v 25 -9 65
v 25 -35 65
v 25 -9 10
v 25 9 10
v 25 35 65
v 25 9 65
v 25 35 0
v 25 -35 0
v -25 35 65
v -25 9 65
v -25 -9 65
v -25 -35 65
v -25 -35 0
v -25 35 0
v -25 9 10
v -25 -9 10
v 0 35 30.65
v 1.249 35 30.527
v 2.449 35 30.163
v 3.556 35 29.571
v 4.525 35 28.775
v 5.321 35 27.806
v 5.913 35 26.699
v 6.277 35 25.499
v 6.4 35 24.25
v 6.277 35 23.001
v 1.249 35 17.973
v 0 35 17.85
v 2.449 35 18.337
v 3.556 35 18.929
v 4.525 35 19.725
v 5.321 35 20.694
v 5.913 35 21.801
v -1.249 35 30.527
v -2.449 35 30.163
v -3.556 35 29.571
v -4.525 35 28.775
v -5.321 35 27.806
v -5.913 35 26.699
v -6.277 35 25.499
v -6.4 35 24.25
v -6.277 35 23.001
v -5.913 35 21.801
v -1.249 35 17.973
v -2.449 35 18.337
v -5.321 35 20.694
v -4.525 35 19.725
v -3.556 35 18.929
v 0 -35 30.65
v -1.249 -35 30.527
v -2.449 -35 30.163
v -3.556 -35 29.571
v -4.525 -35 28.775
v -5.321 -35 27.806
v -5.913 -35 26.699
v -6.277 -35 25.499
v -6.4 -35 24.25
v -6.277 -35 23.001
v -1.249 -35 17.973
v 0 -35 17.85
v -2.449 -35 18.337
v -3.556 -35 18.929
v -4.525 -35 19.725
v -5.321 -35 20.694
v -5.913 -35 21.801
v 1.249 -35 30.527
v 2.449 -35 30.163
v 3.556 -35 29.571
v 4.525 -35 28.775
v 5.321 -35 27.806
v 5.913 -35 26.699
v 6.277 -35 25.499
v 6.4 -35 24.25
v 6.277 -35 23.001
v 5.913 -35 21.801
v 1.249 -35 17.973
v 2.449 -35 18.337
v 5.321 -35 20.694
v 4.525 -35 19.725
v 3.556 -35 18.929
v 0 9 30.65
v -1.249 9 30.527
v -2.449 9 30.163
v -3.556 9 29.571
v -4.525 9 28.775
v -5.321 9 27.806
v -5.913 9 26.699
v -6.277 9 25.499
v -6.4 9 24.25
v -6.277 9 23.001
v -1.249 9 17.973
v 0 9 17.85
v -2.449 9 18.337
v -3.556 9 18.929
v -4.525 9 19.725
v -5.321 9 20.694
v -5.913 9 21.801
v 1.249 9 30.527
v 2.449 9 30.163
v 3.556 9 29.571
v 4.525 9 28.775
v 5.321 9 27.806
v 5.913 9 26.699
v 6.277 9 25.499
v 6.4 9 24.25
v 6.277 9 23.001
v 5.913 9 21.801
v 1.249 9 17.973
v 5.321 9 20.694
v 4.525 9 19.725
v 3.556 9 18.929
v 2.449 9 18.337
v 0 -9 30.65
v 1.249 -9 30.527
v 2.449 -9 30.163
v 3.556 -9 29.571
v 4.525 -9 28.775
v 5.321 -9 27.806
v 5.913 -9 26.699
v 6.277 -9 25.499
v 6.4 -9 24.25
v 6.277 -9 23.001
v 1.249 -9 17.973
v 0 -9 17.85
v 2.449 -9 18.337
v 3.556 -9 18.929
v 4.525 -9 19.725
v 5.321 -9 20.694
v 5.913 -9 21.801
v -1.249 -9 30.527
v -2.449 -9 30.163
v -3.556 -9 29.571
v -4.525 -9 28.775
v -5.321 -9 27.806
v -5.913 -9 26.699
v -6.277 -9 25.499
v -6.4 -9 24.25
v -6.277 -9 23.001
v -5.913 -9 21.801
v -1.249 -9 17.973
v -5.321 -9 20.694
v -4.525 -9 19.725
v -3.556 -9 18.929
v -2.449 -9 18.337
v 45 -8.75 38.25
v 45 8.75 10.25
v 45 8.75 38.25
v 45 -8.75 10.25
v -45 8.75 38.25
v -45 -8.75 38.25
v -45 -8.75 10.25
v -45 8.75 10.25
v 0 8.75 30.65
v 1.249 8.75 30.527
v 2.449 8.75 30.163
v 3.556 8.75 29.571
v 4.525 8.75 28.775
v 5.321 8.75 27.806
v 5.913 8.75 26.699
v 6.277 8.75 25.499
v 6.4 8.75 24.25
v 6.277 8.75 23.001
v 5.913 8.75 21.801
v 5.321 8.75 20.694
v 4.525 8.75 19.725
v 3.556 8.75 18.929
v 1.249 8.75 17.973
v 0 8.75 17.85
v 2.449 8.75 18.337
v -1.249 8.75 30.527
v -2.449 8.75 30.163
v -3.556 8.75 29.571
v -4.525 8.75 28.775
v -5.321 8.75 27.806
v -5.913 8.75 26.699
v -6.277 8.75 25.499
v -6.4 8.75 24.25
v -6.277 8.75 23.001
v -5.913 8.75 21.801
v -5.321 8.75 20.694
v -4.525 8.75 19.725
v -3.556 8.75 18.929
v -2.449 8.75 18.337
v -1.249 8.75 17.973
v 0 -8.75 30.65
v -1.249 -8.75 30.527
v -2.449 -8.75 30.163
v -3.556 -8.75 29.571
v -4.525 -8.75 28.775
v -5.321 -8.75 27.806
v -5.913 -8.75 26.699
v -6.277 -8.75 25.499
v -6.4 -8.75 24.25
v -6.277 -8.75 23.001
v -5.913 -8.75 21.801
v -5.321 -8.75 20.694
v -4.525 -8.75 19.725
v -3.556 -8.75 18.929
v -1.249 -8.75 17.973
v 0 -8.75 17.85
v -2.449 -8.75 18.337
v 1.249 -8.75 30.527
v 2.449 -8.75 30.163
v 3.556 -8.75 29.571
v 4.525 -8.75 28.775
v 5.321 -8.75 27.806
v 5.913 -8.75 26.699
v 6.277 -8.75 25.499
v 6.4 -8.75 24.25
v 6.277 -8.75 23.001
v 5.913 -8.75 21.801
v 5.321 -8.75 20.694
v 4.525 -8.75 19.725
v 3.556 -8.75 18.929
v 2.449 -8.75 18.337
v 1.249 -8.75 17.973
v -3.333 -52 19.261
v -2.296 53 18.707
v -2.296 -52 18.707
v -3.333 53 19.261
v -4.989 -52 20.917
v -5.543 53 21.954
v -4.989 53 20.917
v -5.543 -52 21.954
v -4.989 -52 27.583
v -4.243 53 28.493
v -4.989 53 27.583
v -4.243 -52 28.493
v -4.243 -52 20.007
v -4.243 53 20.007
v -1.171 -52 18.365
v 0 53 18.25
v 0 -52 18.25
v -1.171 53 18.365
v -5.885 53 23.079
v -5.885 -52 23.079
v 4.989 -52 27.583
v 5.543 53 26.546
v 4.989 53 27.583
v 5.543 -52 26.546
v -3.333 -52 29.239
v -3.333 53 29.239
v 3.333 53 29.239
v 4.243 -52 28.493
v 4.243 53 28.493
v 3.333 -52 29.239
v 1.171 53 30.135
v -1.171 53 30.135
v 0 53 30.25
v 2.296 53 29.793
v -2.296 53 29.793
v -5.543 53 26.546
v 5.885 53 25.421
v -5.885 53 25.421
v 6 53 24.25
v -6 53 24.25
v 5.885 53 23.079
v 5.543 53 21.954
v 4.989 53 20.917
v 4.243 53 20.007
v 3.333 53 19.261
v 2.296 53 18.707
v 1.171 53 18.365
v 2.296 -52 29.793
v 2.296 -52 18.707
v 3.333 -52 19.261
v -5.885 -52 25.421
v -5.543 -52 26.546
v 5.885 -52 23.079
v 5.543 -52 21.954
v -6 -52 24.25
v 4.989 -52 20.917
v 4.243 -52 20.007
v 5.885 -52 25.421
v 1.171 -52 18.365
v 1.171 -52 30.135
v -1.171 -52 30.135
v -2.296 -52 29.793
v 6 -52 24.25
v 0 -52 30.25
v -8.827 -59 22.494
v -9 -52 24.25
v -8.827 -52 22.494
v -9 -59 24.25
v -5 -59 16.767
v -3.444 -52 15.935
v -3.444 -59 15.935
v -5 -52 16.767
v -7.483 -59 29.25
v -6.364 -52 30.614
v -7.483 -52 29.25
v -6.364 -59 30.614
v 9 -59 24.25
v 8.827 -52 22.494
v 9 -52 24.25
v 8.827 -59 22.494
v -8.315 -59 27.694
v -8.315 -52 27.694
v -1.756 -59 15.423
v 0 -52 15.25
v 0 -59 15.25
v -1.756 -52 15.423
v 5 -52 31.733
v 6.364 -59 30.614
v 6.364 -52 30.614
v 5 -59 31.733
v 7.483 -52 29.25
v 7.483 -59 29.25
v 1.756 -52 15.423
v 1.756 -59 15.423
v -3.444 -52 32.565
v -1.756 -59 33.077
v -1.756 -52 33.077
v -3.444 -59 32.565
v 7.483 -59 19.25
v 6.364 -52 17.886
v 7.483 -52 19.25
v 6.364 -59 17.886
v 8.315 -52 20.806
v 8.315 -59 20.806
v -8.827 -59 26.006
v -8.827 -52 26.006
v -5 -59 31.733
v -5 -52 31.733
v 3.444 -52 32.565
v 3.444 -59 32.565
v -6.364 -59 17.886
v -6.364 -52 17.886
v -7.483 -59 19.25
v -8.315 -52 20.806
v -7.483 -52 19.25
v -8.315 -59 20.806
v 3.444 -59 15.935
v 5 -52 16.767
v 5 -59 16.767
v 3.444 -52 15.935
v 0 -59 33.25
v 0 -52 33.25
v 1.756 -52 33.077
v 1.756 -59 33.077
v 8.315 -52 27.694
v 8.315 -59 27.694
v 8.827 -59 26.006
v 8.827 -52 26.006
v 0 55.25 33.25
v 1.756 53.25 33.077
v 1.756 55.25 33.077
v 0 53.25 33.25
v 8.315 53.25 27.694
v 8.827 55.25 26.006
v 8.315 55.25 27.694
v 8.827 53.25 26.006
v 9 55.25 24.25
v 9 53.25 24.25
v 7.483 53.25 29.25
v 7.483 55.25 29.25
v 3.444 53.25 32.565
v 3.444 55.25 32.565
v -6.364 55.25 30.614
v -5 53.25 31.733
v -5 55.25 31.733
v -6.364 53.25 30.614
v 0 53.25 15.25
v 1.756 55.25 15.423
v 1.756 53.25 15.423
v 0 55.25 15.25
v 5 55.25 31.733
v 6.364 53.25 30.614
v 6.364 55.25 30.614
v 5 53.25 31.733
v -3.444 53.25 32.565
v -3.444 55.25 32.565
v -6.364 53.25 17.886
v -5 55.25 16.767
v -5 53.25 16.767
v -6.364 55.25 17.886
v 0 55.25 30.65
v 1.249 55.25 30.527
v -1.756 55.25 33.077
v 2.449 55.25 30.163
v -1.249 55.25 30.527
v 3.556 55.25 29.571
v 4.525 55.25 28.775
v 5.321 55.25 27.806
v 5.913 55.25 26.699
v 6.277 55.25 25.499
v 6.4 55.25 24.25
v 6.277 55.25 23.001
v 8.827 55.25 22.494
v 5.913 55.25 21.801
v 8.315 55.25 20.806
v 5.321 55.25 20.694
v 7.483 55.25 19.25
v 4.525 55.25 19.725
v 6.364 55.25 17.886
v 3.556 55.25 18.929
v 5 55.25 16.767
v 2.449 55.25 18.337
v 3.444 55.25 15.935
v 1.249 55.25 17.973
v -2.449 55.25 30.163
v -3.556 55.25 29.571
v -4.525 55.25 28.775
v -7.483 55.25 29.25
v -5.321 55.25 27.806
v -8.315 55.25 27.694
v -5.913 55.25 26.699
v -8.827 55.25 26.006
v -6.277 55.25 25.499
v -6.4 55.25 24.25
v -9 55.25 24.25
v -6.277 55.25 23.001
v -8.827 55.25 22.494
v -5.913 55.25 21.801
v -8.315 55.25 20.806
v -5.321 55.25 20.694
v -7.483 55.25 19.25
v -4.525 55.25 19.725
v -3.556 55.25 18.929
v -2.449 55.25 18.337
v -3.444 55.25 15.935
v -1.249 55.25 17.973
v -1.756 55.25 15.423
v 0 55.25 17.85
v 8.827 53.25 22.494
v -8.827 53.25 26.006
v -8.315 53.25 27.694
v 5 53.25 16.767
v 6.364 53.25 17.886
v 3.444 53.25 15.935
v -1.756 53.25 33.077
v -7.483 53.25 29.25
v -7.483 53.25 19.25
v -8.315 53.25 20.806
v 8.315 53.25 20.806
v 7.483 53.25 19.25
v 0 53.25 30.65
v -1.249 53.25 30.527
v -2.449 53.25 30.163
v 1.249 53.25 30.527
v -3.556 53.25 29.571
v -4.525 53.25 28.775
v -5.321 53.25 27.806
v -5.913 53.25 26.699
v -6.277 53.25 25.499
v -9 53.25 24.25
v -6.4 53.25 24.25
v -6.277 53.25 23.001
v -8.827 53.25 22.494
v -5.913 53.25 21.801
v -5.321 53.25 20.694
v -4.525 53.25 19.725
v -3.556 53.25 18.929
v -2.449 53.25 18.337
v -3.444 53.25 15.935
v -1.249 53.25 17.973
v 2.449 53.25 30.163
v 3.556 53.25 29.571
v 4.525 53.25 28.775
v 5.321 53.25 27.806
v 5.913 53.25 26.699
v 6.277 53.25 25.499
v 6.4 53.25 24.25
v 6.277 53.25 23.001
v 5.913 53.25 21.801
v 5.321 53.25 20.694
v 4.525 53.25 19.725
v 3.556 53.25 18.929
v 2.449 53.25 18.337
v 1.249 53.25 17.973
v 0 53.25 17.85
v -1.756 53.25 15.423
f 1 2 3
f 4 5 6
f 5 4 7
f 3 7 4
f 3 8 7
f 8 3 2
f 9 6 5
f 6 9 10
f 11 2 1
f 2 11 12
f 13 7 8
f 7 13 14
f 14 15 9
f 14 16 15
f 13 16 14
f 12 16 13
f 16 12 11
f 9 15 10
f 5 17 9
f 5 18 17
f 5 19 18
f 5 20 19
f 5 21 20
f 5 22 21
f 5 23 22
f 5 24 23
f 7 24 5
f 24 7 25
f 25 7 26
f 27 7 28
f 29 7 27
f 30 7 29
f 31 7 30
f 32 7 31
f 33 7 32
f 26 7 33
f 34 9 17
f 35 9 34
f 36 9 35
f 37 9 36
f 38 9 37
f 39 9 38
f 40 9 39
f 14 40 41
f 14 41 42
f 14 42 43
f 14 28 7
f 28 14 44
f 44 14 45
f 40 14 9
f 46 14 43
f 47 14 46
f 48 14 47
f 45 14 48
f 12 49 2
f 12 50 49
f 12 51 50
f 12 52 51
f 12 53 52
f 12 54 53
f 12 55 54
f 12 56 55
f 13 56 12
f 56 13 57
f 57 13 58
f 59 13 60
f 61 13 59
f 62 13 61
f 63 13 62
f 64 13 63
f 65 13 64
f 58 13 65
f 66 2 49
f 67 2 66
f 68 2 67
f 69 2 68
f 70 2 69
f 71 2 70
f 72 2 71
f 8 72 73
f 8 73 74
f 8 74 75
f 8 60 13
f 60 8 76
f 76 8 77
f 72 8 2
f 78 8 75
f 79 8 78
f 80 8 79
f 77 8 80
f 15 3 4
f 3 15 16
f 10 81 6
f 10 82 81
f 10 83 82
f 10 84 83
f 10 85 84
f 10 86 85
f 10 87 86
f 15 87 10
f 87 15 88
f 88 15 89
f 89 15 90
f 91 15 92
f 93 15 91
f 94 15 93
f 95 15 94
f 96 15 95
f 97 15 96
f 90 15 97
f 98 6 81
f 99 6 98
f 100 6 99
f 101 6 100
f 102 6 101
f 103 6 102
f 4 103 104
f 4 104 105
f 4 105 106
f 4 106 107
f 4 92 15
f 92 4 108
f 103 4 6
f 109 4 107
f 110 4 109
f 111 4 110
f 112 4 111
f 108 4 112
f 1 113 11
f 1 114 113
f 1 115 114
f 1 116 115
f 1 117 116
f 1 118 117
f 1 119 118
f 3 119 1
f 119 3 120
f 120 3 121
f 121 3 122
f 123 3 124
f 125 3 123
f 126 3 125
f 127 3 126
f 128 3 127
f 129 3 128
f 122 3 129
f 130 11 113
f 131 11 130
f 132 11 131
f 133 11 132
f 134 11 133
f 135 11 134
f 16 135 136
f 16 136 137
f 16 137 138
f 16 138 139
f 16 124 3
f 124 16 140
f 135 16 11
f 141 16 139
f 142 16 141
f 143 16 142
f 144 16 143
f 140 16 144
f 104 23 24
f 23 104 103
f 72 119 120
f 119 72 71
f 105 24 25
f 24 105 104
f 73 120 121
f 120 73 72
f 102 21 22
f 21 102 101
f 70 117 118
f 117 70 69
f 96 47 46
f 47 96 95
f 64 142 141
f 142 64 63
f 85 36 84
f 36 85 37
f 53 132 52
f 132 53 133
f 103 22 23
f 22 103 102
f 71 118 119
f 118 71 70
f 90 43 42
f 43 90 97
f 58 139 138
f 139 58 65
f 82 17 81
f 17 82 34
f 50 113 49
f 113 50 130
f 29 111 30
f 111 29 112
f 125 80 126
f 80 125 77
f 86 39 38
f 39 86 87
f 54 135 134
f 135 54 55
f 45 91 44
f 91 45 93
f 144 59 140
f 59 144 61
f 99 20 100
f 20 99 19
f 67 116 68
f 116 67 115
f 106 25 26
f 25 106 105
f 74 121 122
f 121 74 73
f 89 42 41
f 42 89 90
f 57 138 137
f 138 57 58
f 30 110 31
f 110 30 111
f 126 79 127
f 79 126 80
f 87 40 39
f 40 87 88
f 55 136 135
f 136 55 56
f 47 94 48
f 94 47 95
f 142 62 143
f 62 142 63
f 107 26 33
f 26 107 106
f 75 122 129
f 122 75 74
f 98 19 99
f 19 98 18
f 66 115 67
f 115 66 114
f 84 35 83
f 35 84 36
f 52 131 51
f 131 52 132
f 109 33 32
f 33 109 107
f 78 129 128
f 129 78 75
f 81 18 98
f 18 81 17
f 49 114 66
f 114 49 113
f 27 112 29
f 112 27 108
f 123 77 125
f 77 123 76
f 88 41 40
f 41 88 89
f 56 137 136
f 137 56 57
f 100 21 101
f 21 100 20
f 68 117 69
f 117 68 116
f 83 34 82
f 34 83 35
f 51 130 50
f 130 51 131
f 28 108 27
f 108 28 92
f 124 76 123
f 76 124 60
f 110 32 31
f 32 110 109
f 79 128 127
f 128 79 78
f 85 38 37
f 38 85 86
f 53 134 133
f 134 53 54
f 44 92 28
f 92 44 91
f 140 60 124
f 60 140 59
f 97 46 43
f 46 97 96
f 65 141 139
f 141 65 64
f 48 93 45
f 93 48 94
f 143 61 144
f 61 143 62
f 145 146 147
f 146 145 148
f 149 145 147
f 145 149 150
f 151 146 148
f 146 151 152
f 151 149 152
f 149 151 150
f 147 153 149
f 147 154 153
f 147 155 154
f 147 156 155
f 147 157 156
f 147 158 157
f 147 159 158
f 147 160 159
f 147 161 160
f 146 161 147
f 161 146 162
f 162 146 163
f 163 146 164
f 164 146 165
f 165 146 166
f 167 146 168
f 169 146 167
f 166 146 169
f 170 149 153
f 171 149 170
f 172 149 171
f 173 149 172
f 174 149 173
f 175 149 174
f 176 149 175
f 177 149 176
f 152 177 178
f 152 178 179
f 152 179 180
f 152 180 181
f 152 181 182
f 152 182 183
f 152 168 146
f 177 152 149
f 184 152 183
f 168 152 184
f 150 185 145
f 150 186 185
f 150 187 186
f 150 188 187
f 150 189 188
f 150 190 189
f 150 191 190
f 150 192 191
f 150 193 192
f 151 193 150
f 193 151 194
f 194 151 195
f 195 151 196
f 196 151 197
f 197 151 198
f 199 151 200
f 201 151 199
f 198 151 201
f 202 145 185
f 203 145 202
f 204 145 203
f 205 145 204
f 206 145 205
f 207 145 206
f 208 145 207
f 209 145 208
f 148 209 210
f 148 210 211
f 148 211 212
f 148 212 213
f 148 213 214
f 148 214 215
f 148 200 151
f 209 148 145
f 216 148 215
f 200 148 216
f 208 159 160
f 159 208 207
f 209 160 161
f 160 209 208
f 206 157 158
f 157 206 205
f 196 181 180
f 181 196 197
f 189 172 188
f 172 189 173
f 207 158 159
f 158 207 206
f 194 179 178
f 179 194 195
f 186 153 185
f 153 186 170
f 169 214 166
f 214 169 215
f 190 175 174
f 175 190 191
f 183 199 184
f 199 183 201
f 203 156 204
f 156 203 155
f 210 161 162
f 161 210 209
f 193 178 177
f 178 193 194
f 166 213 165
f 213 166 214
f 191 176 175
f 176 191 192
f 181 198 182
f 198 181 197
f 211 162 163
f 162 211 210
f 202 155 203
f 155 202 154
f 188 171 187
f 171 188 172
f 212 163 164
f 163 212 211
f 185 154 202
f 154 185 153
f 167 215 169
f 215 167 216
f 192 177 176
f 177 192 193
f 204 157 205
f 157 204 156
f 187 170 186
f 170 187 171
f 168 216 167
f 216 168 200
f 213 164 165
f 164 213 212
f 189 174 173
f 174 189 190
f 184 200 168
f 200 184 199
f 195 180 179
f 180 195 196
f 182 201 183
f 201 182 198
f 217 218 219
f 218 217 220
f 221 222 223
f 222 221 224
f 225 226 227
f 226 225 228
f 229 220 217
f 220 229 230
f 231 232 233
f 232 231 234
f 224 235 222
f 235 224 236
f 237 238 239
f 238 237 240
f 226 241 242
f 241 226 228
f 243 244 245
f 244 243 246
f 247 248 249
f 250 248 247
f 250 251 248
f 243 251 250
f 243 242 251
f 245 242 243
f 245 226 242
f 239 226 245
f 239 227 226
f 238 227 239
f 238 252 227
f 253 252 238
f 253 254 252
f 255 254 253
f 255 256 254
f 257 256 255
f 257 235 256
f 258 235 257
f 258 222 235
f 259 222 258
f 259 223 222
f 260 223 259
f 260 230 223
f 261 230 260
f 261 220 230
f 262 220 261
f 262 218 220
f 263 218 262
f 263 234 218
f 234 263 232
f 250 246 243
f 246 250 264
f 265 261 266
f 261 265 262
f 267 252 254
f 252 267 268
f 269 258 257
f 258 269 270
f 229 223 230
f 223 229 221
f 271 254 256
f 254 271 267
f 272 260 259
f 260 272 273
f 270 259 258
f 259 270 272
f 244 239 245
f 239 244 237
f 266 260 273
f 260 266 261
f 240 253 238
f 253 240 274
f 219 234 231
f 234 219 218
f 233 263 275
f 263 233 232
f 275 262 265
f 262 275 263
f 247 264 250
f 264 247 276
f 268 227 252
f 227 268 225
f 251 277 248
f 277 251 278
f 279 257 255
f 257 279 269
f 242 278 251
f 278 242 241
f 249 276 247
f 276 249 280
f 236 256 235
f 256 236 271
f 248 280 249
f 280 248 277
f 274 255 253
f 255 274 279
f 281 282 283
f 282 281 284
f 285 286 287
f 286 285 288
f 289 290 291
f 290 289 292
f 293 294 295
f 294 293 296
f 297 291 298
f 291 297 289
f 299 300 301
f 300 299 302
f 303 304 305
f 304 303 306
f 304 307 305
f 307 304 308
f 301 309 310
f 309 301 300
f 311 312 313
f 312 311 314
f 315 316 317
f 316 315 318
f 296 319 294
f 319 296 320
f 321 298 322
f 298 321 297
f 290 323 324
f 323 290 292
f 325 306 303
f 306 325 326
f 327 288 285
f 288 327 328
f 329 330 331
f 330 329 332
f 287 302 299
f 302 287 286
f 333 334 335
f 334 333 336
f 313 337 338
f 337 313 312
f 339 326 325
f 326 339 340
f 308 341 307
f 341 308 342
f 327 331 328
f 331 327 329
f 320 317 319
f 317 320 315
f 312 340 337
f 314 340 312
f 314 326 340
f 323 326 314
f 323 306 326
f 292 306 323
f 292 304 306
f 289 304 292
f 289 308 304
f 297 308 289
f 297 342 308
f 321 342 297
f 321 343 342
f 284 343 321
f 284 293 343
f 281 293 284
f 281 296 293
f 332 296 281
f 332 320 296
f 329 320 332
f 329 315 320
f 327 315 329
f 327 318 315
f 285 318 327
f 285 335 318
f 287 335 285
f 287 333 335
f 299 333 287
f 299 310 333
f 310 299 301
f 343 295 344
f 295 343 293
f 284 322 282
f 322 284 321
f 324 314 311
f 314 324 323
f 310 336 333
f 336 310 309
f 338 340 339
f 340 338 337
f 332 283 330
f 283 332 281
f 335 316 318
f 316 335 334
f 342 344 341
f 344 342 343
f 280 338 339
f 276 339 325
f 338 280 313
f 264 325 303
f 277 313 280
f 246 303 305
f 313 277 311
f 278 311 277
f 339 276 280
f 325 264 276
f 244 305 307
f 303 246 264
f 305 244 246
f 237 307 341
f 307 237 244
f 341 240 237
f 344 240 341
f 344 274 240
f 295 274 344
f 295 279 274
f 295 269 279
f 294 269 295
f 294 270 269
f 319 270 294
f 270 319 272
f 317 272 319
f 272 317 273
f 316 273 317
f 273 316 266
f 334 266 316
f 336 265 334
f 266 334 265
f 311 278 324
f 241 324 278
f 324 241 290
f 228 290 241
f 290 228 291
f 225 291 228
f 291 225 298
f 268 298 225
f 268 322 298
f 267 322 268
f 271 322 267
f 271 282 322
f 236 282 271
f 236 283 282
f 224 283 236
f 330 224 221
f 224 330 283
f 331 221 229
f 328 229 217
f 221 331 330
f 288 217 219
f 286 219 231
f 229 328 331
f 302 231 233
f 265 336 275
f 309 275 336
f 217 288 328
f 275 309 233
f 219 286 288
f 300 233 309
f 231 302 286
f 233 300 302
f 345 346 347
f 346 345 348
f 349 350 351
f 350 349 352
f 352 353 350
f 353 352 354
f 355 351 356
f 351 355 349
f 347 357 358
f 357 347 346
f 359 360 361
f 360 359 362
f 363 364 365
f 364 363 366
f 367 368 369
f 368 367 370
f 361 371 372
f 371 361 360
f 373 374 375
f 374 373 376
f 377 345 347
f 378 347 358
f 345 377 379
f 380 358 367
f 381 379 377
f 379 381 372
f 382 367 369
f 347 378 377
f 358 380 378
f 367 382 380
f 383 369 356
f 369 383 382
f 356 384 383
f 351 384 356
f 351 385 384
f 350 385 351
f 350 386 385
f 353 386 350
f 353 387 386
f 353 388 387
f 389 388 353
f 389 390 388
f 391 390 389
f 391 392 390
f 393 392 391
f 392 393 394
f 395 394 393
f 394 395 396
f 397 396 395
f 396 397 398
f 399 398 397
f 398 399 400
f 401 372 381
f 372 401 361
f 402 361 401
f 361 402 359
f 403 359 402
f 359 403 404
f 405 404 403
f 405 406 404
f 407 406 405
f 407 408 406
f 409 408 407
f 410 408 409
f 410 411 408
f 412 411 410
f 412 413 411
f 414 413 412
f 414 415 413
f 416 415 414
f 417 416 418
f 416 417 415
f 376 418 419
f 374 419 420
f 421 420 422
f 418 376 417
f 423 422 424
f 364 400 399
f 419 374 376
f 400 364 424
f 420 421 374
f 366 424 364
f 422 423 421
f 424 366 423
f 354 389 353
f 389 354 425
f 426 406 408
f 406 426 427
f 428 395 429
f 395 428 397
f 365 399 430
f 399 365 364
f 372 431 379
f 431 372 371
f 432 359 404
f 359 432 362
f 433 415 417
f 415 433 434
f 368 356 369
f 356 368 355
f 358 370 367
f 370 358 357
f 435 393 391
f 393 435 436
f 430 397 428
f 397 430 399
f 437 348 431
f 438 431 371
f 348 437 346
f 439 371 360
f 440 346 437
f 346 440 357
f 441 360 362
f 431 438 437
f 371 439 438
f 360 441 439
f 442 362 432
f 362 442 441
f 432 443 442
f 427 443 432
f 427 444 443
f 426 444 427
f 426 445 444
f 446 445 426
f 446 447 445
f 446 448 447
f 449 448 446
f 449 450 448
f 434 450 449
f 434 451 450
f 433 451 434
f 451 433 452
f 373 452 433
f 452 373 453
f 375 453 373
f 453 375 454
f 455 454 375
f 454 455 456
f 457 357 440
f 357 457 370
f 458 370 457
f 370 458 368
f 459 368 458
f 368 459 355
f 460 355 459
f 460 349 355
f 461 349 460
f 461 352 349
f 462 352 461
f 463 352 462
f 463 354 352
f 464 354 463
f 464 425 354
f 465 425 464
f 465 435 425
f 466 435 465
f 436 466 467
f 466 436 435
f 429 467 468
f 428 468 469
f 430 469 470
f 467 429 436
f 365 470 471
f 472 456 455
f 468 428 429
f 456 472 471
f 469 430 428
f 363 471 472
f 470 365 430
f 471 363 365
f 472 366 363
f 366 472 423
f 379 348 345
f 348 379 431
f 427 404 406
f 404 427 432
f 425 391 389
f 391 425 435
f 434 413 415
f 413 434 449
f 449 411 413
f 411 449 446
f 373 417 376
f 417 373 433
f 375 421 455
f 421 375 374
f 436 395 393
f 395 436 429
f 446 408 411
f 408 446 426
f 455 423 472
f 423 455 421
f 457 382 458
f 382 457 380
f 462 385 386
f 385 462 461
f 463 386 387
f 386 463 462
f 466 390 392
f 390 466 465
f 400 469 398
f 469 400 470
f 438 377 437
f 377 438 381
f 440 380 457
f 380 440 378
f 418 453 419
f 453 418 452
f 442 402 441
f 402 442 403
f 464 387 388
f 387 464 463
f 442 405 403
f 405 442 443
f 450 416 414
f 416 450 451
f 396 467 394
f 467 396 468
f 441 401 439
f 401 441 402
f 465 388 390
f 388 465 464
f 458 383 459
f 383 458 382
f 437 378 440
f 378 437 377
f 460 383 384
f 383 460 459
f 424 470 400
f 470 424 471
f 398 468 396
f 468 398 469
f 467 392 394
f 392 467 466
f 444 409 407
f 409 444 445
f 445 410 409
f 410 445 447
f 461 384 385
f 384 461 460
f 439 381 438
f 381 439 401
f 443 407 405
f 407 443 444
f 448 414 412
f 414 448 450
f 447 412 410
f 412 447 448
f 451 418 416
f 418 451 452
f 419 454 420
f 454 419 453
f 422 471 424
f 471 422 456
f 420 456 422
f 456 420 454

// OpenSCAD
$fn = 32;

// ------------------------------------------------------------------------
// Clevis joint: 50 mm clevis, pin d12
// Every part is its own module, assembly() places them once.
// ------------------------------------------------------------------------

// --- part 1 ---
module clevis() {
  difference() {
    translate([-25, -35, 0]) cube([50, 70, 65]);
    translate([-26, -9, 10]) cube([52, 18, 56]);
    translate([0, 0, 24.25]) rotate([90, 0, 0]) cylinder(h = 72, d = 12.8, center = true);
  }
}

// --- part 2 ---
module eye() {
  difference() {
    translate([-45, -8.75, 0]) cube([90, 17.5, 28]);
    translate([0, 0, 14]) rotate([90, 0, 0]) cylinder(h = 19.5, d = 12.8, center = true);
  }
}

// --- part 3 ---
module pin() {
  rotate([0, 90, 0]) cylinder(h = 106, d = 12, center = true);
  translate([-59, 0, 0]) rotate([0, 90, 0]) cylinder(h = 7, d = 18);
}

// --- part 4 ---
module retainer() {
  difference() {
      translate([0, 0, 0]) cylinder(h = 2, d = 18);
      translate([0, 0, -1]) cylinder(h = 4, d = 12.8);
    }
}

// --- assembly ---
module assembly() {
  translate([0, 0, 0]) rotate([0, 0, 0]) clevis();
  translate([0, 0, 10.25]) rotate([0, 0, 0]) eye();
  translate([0, 0, 24.25]) rotate([0, 0, 90]) pin();
  translate([0, 55.25, 24.25]) rotate([90, 0, 0]) retainer();
}

assembly();
